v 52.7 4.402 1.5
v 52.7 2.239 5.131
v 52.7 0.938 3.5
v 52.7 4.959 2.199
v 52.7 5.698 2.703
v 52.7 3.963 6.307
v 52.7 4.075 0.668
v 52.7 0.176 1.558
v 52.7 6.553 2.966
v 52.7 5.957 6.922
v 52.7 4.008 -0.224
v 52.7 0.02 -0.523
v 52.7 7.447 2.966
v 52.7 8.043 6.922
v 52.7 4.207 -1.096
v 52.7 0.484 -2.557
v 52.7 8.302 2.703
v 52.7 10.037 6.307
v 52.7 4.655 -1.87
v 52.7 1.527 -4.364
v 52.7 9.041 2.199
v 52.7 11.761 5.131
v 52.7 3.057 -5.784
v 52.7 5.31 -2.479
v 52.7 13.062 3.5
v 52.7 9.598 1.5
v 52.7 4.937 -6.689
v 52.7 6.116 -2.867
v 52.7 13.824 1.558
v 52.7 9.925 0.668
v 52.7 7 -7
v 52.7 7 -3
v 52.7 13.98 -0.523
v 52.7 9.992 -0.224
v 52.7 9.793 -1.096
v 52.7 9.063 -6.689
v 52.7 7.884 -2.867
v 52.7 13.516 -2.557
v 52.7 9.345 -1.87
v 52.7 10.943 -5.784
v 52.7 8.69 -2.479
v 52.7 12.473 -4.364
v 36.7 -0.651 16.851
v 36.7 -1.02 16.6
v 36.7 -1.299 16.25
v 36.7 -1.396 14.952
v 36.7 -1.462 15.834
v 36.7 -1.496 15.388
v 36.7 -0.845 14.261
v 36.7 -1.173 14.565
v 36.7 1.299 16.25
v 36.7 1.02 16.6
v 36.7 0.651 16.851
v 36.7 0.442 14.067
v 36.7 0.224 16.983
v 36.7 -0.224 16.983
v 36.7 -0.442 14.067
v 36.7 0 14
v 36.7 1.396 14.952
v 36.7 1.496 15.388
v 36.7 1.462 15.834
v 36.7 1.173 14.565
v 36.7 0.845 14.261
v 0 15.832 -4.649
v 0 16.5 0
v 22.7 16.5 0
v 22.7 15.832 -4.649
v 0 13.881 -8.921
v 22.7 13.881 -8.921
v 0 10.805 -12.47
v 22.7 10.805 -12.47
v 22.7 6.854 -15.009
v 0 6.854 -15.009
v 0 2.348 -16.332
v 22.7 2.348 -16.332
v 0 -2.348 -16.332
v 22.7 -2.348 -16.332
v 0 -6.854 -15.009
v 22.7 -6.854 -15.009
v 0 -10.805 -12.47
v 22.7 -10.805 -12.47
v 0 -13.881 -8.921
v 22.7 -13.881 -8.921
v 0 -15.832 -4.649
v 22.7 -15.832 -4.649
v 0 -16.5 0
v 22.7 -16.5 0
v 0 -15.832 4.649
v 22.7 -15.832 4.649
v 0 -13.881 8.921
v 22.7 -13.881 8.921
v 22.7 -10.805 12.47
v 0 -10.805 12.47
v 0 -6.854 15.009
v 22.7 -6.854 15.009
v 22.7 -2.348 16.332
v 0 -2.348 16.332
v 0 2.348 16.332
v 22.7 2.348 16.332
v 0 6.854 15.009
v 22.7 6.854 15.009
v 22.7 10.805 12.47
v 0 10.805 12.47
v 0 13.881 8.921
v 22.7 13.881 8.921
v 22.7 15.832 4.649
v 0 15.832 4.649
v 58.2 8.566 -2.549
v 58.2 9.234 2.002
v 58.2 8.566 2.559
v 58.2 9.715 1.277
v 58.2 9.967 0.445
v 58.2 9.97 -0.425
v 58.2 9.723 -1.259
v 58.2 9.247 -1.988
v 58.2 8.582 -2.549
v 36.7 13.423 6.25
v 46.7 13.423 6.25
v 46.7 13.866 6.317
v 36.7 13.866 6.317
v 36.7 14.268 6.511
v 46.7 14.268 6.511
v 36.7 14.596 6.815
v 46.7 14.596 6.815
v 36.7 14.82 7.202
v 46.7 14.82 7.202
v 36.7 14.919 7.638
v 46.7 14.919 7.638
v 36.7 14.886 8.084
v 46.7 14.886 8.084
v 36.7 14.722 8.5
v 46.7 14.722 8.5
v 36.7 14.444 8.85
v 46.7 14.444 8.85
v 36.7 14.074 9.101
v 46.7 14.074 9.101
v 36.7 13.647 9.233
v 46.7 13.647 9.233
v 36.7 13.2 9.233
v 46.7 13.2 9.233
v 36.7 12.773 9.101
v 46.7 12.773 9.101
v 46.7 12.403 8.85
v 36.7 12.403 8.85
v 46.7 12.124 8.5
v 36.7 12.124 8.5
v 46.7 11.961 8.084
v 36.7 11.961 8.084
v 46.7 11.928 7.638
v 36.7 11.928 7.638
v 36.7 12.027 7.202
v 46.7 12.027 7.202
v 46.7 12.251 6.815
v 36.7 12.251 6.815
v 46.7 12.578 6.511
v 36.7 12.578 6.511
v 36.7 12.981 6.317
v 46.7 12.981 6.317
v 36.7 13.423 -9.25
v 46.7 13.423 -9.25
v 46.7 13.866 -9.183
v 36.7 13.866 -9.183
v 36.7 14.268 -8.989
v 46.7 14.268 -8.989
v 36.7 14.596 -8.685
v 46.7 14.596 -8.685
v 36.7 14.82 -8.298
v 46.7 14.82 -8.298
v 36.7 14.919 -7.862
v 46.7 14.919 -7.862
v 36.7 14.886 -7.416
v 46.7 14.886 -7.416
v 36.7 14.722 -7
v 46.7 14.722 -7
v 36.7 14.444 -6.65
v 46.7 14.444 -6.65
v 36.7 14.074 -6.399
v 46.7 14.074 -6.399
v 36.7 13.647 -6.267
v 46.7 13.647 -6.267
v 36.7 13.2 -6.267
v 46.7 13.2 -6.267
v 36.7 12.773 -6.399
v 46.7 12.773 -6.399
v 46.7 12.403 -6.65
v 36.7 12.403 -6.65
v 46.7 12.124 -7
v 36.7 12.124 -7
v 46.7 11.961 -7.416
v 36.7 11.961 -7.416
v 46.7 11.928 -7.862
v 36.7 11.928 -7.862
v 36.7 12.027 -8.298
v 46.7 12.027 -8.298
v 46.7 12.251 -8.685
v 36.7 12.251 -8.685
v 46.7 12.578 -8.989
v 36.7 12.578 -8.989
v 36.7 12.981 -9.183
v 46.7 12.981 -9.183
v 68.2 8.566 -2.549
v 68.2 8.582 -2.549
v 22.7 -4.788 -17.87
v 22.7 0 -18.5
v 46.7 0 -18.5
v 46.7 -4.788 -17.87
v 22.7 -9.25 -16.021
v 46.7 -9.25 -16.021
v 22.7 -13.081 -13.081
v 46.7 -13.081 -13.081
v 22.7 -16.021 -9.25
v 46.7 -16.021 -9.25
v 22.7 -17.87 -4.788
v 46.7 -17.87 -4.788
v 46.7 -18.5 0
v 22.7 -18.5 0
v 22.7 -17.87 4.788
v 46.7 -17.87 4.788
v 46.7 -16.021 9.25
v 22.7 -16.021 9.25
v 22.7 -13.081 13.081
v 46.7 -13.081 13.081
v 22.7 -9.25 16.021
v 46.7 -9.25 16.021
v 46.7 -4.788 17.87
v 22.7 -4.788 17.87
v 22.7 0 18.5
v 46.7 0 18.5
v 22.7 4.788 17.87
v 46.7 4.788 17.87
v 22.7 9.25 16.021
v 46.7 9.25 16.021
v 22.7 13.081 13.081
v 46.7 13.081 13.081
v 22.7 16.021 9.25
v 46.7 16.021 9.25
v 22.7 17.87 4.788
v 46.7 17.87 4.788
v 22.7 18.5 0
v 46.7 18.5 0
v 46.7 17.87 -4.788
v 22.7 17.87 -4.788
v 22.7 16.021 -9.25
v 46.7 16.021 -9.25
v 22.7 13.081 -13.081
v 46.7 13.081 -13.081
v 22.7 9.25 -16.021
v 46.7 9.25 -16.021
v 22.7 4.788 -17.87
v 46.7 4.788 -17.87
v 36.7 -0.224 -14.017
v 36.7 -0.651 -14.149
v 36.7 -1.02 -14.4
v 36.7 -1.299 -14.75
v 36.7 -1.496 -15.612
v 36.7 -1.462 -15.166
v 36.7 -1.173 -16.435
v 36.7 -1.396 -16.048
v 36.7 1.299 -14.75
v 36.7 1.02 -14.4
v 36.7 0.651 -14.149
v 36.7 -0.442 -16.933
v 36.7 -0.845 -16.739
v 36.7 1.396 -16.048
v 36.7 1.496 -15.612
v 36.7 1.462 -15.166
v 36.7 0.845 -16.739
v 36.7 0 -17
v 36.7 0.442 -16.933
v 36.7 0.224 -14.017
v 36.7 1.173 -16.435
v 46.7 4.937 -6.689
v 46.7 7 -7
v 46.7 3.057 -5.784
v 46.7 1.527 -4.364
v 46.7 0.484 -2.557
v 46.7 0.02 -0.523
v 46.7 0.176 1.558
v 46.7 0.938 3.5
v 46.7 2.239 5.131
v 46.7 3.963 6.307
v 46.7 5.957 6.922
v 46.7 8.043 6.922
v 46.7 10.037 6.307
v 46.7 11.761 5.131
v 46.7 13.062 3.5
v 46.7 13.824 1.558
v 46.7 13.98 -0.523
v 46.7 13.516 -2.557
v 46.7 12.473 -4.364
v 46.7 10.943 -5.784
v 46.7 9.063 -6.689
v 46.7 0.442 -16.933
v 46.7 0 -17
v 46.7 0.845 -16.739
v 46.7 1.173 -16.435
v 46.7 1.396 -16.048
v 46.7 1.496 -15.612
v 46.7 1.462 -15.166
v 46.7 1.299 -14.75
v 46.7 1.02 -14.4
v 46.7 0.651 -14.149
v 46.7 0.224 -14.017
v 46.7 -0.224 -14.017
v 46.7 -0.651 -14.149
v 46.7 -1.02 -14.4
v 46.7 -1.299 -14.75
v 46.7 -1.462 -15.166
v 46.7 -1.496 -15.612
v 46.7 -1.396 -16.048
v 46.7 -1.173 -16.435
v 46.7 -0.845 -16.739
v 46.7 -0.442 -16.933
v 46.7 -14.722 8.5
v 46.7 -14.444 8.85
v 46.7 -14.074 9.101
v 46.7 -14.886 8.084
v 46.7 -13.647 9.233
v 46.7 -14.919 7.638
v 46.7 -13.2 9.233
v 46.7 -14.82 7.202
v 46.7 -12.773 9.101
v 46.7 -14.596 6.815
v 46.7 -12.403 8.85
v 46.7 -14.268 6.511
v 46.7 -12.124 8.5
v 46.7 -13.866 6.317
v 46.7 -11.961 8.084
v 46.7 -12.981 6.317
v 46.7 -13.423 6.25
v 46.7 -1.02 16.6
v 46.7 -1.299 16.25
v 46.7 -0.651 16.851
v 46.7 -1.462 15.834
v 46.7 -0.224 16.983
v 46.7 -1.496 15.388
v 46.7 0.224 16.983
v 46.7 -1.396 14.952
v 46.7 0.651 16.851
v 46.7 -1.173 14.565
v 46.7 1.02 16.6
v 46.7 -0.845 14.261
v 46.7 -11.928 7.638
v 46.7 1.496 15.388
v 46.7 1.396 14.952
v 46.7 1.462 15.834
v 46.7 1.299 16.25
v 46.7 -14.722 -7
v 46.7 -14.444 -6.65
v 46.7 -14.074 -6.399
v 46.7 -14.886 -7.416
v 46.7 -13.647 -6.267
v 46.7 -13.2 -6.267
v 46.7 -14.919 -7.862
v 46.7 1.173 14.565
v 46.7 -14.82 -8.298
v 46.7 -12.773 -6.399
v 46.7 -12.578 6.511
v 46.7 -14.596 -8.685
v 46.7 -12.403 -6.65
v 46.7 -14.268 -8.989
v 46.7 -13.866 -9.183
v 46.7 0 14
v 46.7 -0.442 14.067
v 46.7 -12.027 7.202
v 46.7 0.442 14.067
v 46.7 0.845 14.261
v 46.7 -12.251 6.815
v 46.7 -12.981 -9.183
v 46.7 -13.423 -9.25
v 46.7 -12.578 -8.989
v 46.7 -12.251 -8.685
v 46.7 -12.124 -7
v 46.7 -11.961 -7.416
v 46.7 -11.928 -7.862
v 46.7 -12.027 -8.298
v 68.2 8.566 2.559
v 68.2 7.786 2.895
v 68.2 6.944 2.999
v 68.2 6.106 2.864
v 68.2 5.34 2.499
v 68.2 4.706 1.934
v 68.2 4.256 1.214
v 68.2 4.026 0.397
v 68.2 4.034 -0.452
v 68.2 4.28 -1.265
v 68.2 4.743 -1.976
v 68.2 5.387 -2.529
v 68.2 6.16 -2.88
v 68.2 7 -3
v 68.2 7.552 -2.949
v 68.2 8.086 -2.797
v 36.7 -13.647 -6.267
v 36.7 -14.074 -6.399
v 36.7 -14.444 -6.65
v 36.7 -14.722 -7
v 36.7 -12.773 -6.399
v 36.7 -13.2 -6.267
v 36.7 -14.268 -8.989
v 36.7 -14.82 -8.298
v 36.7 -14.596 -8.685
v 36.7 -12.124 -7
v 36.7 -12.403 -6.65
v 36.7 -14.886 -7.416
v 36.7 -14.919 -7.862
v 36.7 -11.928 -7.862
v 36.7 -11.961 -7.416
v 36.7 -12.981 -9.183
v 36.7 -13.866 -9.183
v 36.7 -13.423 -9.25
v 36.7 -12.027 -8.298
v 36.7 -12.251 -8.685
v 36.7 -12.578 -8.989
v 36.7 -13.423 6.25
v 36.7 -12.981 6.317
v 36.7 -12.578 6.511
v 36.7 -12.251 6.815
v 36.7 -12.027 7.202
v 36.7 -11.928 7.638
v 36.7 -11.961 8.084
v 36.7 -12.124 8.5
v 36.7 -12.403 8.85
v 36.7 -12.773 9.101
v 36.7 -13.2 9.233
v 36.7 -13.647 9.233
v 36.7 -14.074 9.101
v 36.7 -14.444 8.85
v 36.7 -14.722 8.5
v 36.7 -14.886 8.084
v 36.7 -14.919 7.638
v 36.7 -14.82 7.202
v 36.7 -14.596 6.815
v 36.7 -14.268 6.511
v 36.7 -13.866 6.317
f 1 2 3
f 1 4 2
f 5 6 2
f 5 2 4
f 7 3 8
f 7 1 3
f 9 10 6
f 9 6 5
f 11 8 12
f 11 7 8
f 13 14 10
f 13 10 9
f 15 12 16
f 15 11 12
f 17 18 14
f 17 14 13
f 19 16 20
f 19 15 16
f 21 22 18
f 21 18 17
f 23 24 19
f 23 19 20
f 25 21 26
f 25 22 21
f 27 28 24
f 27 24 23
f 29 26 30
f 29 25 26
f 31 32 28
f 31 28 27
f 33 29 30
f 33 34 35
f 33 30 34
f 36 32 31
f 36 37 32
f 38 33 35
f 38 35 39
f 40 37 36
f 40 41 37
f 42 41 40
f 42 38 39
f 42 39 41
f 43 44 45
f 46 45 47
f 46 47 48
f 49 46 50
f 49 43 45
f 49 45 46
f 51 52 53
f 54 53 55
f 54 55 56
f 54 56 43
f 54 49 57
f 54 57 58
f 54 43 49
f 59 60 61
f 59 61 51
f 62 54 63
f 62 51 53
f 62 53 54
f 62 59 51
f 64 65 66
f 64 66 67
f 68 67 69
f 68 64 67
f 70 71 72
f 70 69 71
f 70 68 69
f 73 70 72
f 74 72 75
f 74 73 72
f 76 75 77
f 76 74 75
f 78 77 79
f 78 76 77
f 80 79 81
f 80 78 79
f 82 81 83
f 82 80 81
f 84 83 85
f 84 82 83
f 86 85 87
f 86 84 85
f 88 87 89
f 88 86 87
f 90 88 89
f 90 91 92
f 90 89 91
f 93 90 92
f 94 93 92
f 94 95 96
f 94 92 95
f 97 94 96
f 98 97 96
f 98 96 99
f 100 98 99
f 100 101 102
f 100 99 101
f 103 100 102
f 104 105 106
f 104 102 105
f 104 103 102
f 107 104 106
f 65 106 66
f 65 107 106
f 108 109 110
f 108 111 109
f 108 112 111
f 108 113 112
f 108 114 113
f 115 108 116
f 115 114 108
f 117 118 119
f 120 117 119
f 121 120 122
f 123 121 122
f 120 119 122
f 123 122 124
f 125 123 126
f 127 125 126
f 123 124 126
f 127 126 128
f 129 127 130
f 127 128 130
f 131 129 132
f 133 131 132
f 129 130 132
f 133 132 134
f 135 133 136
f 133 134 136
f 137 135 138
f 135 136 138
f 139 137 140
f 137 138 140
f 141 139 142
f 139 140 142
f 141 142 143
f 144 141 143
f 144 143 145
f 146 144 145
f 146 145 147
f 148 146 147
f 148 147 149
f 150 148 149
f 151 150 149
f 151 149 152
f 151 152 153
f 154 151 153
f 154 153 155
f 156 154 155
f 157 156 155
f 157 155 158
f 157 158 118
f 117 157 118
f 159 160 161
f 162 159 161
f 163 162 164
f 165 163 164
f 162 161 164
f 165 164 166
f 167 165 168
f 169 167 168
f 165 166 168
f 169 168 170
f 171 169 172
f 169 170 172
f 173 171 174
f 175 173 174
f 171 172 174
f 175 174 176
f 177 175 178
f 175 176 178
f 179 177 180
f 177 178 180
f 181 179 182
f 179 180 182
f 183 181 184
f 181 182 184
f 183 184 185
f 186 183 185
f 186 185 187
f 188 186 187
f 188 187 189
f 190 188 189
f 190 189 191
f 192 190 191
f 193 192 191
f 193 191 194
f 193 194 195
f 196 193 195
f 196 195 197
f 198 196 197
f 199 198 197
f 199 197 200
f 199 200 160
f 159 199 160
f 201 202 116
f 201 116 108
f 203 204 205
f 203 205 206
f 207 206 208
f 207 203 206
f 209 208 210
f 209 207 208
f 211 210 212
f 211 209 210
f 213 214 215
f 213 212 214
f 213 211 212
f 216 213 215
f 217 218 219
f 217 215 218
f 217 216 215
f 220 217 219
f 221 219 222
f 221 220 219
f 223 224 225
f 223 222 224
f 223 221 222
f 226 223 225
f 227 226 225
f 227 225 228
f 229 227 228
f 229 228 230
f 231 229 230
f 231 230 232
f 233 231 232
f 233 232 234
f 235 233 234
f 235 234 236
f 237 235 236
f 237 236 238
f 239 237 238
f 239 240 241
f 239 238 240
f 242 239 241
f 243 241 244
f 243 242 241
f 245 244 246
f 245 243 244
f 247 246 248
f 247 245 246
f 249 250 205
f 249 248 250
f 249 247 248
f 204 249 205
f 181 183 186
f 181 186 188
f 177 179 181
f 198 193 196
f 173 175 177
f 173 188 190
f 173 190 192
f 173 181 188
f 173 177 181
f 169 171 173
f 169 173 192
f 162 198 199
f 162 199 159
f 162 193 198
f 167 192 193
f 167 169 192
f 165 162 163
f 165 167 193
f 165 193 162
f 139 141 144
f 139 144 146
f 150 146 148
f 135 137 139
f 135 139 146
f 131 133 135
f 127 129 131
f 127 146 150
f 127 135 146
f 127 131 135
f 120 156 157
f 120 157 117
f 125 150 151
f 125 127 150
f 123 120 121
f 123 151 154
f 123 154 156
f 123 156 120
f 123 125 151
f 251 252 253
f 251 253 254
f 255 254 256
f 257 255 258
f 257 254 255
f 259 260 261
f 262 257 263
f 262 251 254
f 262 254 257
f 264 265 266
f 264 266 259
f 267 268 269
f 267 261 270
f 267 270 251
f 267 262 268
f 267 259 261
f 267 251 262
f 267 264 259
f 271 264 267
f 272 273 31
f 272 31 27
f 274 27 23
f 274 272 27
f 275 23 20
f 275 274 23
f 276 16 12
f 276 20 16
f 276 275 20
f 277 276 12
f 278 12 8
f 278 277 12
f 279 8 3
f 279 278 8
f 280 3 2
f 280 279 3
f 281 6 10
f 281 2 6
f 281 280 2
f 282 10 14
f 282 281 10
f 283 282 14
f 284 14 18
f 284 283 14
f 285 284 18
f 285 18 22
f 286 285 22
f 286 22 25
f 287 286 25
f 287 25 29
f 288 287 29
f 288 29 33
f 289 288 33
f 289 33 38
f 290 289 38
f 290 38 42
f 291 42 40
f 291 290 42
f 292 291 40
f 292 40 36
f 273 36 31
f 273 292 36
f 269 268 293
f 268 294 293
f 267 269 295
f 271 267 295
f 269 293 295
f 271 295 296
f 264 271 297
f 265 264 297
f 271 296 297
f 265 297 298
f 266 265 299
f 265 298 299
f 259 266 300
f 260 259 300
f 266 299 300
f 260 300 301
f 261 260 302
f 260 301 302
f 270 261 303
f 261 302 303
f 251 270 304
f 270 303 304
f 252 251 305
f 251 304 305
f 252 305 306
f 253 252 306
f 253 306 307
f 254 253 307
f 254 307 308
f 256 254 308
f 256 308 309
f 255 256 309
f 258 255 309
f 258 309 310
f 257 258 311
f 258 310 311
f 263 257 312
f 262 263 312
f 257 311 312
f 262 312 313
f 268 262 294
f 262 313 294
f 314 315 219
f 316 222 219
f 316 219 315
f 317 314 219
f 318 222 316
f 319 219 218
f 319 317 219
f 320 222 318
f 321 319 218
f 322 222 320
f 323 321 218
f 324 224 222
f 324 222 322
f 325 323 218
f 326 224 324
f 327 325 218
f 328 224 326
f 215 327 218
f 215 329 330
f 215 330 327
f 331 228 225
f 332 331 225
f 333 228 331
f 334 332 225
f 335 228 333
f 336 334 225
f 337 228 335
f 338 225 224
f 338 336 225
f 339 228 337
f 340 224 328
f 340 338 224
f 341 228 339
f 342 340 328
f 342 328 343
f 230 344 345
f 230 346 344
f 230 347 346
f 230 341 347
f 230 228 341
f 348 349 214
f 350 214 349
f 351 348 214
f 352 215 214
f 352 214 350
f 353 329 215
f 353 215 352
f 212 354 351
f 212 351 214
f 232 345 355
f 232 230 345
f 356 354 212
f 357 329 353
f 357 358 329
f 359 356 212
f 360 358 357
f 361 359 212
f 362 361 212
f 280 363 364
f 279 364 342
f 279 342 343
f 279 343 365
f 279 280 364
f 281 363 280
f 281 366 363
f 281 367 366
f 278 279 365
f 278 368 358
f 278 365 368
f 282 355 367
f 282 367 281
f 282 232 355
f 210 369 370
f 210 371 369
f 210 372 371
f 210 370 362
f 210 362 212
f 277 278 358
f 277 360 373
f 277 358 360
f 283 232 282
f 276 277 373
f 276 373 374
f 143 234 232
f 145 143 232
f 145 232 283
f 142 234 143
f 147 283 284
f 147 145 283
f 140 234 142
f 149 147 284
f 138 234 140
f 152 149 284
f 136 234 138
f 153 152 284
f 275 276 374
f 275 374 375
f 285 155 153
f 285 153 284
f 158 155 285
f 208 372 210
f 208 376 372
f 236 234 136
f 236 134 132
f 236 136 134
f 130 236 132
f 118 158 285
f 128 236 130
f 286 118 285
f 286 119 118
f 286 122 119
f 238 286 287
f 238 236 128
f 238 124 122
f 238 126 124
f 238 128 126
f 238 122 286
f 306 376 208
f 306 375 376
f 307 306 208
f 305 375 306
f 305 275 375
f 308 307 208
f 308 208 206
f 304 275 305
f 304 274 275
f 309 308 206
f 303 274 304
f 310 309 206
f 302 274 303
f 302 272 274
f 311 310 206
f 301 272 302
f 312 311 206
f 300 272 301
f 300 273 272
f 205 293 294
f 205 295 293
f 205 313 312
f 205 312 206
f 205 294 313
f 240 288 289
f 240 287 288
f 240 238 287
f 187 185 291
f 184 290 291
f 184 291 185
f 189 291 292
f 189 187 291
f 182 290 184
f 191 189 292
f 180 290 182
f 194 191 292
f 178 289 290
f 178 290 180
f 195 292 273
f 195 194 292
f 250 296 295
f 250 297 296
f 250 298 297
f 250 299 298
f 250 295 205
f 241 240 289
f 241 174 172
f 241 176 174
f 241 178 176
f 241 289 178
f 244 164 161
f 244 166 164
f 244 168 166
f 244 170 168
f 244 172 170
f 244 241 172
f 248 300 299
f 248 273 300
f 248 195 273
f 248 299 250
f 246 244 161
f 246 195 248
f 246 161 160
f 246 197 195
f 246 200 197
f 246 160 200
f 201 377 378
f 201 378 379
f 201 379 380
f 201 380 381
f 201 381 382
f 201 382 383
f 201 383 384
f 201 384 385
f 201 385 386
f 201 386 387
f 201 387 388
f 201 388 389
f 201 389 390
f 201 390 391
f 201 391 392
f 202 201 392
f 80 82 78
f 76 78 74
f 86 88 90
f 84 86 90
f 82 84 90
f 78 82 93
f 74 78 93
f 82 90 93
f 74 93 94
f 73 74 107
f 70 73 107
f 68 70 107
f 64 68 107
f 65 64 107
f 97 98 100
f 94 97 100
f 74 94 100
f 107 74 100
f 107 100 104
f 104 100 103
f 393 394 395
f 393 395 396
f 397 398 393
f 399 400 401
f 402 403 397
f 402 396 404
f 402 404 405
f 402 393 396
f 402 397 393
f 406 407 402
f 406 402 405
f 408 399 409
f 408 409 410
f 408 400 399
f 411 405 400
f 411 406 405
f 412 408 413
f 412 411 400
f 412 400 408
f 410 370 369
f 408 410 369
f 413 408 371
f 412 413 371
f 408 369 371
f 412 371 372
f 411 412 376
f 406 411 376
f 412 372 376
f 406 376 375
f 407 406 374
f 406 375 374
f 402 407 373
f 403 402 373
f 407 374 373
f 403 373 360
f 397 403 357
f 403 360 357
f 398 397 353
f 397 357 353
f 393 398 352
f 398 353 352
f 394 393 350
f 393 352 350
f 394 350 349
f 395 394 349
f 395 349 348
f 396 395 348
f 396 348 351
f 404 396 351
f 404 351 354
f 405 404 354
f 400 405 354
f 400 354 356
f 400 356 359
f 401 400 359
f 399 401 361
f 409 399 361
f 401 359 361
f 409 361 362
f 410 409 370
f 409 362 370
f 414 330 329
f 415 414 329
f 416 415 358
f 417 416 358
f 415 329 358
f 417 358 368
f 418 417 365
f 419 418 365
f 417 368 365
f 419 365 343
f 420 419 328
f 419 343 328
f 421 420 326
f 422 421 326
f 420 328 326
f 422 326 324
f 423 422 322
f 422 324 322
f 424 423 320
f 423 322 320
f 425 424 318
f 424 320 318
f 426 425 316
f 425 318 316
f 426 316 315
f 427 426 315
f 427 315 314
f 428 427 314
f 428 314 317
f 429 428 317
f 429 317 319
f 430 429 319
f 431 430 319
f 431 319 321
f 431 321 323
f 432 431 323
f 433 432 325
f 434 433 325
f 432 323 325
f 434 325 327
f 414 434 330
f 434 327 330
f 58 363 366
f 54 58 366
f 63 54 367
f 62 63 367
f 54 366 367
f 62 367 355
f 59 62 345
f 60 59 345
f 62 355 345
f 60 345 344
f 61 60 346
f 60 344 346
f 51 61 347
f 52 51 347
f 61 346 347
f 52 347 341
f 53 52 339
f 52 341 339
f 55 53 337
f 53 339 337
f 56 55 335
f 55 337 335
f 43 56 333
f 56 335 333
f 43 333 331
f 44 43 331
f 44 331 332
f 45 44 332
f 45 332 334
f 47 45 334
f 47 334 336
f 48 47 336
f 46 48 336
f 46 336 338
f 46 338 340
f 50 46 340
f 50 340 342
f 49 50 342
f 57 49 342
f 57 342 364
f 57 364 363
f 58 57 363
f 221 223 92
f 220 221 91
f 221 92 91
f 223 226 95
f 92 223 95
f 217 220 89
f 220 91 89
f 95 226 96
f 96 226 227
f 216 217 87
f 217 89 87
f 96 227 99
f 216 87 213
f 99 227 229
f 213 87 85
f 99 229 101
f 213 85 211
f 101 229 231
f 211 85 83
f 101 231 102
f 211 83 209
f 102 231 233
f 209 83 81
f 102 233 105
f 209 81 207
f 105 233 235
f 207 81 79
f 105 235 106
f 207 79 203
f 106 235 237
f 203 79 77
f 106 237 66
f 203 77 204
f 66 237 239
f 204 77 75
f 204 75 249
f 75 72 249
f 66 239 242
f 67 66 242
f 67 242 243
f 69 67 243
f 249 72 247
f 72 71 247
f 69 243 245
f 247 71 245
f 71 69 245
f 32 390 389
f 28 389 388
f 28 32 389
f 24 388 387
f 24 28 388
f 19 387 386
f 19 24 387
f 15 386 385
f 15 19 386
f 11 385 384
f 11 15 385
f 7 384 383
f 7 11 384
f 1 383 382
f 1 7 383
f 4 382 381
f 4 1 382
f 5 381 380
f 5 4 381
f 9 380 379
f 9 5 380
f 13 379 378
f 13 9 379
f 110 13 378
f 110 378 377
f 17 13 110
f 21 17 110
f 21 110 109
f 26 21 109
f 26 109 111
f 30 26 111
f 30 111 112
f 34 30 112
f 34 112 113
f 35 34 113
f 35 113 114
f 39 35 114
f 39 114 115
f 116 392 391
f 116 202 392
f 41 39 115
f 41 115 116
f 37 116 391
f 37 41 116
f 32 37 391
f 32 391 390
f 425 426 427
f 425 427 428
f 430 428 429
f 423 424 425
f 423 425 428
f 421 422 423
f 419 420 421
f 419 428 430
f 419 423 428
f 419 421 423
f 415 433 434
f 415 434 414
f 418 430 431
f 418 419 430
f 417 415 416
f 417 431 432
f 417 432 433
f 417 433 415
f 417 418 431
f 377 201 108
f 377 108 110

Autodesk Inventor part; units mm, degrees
ref_plane "YZ Plane" through (0, 0, 0) normal (1, 0, 0) x (0, 1, 0)
ref_plane "XZ Plane" through (0, 0, 0) normal (0, 1, 0) x (-1, 0, 0)
ref_plane "XY Plane" through (0, 0, 0) normal (0, 0, 1) x (1, 0, 0)
sketch "Sketch1" plane through (0, 0, 0) normal (1, 0, 0) x (0, 1, 0)
  circle A0 centre (0, 0) radius 16.5
  dimension "d0" = 33
extrude "Extrusion1" add sketch "Sketch1" along normal blind 22.7
sketch "Sketch2" plane through (22.7, 0, 0) normal (1, 0, 0) x (0, 0, -1)
  circle A0 centre (0, 0) radius 18.5
  dimension "d3" = 37
extrude "Extrusion2" add sketch "Sketch2" along normal blind 24
sketch "Sketch3" plane through (46.7, 0, 0) normal (1, 0, 0) x (0, 0, -1)
  circle A0 centre (0, 7) radius 7
  point P0 (0, 0)
  dimension "d6" = 14
  dimension "d7" = 7
extrude "Extrusion3" add sketch "Sketch3" along normal blind 6
sketch "Sketch4" plane through (52.7, 7, 0) normal (1, 0, 0) x (0, 0, -1)
  circle A0 centre (0, 0) radius 3
  point P0 (0, -7)
  dimension "d10" = 6
extrude "Extrusion4" add sketch "Sketch4" along normal blind 15.5
sketch "Sketch5" plane through (46.7, 0, 0) normal (1, 0, 0) x (0, 0, -1)
  circle A0 centre (-15.5, 0) radius 1.5
  circle A1 centre (0, 7) radius 7 projected
  circle A2 centre (-7.75, -13.4234) radius 1.5
  circle A3 centre (7.75, -13.4234) radius 1.5
  circle A4 centre (15.5, 0) radius 1.5
  circle A5 centre (7.75, 13.4234) radius 1.5
  circle A6 centre (-7.75, 13.4234) radius 1.5
  point P0 (0, 0)
  dimension "d13" = 3
  dimension "d14" = 15.5
  dimension "d17" = 360
extrude "Extrusion5" cut sketch "Sketch5" against normal blind 10 contours A0 | A2 | A3 | A4 | A5 | A6
sketch "Sketch6" plane through (68.2, 7, 0) normal (1, 0, 0) x (0, 0, -1)
  line L0 (-3.2783, 3.4497) -> (2.5487, 3.4497)
  line L1 (2.5487, 3.4497) -> (2.5487, 1.5658)
  line L2 (2.5487, 1.5658) -> (-3.2783, 1.5658)
  line L3 (-3.2783, 1.5658) -> (-3.2783, 3.4497)
  point P0 (0, -7)
extrude "Extrusion6" cut sketch "Sketch6" against normal blind 10
properties part number "DCMotor"
